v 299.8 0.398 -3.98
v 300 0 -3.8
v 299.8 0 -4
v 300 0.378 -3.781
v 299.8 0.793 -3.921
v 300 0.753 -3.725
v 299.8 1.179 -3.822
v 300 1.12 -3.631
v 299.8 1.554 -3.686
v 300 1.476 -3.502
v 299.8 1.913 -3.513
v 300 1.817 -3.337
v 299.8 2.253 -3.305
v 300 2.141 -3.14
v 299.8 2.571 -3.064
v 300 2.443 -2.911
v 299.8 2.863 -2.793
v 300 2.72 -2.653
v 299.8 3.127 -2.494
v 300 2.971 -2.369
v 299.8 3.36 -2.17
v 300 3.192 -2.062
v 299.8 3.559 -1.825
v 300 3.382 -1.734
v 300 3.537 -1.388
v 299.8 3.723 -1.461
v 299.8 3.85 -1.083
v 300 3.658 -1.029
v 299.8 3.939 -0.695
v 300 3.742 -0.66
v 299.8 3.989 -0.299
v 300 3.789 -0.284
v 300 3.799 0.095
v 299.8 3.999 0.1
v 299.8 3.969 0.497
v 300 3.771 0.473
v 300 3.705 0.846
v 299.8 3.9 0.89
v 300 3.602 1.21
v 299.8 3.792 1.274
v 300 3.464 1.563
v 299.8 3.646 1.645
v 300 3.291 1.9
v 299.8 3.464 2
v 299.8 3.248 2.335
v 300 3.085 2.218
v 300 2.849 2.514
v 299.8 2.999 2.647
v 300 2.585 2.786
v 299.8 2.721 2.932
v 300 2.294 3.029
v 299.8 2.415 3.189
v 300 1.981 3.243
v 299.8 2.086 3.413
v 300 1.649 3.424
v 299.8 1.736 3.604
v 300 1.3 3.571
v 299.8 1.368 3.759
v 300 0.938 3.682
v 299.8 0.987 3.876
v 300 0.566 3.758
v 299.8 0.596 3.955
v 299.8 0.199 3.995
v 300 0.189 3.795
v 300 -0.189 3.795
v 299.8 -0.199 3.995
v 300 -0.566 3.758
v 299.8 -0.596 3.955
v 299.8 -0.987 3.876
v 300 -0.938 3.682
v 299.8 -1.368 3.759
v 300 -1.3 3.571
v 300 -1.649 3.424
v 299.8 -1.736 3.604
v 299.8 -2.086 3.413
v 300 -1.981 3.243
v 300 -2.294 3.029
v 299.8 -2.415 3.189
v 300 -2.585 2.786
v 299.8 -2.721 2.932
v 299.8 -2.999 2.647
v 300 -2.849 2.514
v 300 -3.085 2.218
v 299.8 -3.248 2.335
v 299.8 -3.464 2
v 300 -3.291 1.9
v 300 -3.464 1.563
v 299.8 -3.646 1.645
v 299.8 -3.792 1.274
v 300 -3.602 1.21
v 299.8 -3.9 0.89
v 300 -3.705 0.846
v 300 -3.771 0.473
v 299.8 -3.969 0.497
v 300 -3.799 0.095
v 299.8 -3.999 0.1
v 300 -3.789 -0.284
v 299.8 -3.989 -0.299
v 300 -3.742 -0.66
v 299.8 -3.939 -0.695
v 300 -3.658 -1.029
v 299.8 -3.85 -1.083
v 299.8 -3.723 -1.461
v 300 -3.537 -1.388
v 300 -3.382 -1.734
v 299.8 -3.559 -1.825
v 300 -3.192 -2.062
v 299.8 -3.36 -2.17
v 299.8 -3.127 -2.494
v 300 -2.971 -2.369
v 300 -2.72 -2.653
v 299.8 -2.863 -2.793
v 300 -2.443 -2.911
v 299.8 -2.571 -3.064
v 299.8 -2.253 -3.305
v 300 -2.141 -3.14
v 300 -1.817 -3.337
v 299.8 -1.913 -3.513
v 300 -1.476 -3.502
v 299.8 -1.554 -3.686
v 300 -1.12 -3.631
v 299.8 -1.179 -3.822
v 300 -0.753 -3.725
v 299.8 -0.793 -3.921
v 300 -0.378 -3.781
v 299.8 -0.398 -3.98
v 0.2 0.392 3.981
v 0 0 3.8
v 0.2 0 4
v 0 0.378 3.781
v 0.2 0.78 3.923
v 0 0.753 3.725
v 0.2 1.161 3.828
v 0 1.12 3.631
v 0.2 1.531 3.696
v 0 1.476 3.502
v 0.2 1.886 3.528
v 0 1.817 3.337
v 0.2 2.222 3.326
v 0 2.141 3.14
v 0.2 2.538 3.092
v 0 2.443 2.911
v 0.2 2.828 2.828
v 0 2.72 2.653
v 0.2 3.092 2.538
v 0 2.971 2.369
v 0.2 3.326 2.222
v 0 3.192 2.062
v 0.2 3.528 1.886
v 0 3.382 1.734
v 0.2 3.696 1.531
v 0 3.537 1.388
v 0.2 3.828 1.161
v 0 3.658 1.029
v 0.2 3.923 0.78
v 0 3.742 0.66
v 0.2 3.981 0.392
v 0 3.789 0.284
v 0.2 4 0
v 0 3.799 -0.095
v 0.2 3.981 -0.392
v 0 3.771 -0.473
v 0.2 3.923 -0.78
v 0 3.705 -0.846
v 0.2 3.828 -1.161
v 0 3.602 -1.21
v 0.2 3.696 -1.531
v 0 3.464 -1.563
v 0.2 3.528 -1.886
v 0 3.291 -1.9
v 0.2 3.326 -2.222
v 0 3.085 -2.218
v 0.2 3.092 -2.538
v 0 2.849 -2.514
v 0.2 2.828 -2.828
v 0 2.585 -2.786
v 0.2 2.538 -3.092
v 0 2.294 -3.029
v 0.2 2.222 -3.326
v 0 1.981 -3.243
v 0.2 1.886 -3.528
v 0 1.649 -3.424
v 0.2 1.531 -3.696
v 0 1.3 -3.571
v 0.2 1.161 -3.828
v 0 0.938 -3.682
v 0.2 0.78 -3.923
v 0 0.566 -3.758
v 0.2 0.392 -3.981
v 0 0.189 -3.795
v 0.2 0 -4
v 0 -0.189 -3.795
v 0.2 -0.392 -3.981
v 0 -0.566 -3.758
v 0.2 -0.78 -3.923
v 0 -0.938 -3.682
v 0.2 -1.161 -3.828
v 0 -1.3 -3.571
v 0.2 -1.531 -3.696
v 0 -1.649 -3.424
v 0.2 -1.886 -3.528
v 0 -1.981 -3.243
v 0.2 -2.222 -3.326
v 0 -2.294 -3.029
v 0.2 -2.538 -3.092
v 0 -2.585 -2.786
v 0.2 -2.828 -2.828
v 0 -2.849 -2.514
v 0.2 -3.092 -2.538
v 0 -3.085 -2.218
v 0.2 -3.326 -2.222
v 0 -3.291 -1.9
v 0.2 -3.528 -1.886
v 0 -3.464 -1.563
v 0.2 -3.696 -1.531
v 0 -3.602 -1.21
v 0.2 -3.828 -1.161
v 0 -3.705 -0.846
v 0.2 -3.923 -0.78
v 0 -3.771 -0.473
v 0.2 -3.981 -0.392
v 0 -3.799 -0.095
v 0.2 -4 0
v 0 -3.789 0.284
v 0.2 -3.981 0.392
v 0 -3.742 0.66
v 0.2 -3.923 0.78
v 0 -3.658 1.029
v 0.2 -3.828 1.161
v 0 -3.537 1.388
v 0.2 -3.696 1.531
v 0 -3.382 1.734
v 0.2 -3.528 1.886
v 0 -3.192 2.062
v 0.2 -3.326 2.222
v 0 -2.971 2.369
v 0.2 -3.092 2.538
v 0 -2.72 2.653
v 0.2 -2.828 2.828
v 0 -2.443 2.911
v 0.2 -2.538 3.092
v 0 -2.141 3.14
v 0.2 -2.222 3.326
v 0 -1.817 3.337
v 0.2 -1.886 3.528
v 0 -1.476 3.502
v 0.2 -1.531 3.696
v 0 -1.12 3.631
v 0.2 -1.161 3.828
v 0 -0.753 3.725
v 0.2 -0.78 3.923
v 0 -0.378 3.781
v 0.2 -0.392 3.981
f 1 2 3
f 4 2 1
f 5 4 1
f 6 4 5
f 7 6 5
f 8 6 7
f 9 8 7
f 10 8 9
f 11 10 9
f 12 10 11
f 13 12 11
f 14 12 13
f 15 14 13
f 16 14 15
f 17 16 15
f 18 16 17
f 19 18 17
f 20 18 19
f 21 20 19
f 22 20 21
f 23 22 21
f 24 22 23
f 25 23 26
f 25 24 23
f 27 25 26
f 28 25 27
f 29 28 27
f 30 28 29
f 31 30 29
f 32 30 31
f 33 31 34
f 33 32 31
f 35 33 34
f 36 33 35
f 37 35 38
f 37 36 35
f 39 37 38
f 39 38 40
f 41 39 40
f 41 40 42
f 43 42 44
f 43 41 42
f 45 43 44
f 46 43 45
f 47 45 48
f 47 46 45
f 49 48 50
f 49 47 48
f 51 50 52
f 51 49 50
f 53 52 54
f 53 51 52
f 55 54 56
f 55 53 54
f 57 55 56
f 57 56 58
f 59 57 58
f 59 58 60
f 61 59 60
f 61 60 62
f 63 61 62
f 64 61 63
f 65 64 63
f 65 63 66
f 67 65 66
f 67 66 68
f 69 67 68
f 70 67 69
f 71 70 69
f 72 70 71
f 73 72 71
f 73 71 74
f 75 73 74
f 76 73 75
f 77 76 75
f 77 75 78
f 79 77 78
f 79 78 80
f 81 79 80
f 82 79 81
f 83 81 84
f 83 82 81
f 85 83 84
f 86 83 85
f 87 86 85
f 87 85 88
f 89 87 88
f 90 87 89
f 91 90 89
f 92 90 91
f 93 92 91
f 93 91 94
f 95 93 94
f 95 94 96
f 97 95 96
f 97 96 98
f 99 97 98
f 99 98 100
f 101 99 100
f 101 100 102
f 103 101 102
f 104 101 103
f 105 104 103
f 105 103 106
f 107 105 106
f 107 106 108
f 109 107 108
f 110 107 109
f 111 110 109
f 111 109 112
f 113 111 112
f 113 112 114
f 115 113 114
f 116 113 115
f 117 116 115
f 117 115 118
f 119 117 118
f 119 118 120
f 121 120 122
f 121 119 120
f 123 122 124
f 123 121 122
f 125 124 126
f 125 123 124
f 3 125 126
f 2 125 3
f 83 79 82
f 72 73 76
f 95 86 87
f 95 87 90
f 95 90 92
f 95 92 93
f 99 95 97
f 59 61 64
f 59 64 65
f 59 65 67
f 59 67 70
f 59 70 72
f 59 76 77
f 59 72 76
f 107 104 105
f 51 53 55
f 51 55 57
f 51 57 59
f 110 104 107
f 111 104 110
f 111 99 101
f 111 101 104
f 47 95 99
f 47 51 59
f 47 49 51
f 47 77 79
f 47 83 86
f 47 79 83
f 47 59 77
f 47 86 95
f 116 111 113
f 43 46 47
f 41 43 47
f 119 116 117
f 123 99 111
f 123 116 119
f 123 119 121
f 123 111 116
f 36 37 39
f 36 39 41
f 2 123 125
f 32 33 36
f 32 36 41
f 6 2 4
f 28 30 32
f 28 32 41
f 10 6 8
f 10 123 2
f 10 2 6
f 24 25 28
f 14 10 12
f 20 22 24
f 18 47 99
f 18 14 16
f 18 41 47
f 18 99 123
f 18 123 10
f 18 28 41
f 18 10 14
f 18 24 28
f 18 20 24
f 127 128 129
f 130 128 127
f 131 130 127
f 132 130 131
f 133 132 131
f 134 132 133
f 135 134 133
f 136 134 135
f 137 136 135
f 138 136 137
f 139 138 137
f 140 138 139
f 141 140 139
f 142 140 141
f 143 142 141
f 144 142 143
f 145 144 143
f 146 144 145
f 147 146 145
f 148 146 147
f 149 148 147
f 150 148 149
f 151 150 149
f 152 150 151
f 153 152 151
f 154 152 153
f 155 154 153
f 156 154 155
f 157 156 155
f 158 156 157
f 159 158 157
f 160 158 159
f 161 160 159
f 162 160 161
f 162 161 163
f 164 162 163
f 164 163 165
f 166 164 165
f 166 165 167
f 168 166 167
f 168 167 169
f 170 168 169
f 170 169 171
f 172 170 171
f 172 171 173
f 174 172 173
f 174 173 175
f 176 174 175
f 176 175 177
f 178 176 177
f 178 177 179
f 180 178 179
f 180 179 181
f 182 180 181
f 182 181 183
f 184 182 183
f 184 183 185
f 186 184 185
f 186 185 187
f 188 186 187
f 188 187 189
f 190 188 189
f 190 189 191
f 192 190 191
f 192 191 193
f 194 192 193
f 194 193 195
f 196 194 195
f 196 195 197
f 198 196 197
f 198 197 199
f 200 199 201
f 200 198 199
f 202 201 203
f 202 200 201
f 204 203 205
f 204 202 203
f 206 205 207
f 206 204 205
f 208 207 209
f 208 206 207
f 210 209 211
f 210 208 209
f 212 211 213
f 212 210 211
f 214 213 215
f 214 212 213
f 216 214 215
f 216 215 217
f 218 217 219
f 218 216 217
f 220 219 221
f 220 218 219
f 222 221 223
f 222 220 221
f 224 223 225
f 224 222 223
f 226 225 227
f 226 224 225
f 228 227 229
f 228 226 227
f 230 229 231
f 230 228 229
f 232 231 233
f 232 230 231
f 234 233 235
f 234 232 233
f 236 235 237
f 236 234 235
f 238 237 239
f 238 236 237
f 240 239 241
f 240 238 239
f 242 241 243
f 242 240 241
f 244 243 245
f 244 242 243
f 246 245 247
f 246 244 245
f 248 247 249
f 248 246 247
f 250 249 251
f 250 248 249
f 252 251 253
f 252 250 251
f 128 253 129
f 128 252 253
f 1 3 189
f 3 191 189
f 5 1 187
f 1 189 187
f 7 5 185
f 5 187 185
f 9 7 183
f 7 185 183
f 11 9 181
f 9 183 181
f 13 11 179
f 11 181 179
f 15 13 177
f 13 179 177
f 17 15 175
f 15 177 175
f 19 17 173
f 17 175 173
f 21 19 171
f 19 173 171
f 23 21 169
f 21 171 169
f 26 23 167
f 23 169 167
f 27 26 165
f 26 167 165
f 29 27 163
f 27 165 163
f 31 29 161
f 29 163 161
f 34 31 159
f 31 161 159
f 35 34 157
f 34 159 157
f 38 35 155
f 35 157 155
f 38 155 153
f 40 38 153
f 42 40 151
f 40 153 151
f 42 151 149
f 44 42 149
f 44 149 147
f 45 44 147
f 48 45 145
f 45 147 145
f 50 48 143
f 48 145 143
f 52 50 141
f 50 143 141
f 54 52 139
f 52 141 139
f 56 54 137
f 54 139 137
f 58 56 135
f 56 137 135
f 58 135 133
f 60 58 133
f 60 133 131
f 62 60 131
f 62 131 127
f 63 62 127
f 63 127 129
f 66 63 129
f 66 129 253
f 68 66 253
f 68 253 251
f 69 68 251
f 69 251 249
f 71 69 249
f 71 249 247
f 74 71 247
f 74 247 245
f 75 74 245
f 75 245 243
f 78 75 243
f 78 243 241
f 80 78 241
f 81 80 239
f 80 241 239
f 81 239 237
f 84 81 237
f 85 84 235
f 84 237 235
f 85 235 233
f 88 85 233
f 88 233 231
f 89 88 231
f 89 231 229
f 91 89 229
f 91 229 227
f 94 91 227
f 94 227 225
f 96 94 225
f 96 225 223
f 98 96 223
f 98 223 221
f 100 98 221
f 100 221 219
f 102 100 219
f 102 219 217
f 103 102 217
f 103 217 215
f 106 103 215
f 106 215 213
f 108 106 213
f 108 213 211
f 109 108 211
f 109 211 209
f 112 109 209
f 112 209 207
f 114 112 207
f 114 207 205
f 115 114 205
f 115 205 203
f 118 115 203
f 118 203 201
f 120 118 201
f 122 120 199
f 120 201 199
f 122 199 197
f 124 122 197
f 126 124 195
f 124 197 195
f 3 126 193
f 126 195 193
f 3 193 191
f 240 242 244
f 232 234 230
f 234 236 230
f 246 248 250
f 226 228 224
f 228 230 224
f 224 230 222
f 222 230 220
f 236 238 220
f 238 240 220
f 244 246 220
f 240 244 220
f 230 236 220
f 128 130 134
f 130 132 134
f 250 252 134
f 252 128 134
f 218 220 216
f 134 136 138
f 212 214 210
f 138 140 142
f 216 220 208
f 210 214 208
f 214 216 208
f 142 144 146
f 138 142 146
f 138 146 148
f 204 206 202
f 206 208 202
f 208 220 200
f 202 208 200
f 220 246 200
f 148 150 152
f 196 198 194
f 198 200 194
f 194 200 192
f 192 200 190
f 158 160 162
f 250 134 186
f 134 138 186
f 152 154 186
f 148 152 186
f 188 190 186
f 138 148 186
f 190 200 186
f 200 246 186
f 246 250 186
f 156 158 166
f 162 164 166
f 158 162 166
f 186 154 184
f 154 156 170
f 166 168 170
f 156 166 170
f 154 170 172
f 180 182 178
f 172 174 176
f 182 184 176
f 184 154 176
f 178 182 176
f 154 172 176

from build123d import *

# Parameters (mm, degrees)
SKETCH1_R           = 4
BOSS_EXTRUDE1_DEPTH = 300
SKETCH5_OUTSIDE_W   = 672.15
SKETCH5_OUTSIDE_H   = 672.15
SKETCH5_OUTSIDE_R   = 3.8
CUT_EXTRUDE2_DEPTH  = 301.053328593
CUT_EXTRUDE2_DRAFT  = -45
SKETCH6_OUTSIDE_W   = 672.15
SKETCH6_OUTSIDE_H   = 672.15
SKETCH6_OUTSIDE_R   = 3.8
CUT_EXTRUDE3_DEPTH  = 301.053328593
CUT_EXTRUDE3_DRAFT  = -45


with BuildPart() as part:
    # Sketch1 → Boss-Extrude1 (new body)
    with BuildSketch(Plane(origin=(0, 0, 0), x_dir=(0, 0, -1), z_dir=(1, 0, 0))):
        Circle(SKETCH1_R)
    extrude(amount=BOSS_EXTRUDE1_DEPTH)


with BuildPart() as cut_extrude2_tool:
    # Sketch5 outside → Cut-Extrude2 (with draft: the straight prism first)
    with BuildSketch(Plane.ZY):
        Rectangle(SKETCH5_OUTSIDE_W, SKETCH5_OUTSIDE_H)
        Circle(SKETCH5_OUTSIDE_R, mode=Mode.SUBTRACT)
    extrude(amount=-CUT_EXTRUDE2_DEPTH)
    # Cut-Extrude2: the draft: its side faces are tilted about the plane it starts from
    cut_extrude2_sides = [cut_extrude2_tool.faces().sort_by_distance(p)[0] for p in [
        (150.526664297, -336.075, 0),
        (150.526664297, 0, 336.075),
        (150.526664297, 336.075, 0),
        (150.526664297, 0, -336.075),
        (150.526664297, 0, -3.8),
    ]]
    draft(cut_extrude2_sides, Plane.ZY, CUT_EXTRUDE2_DRAFT)


with BuildPart() as part_1:
    add(part.part)

    # Cut-Extrude2: cut by cut_extrude2_tool
    add(cut_extrude2_tool.part, mode=Mode.SUBTRACT)


with BuildPart() as cut_extrude3_tool:
    # Sketch6 outside → Cut-Extrude3 (with draft: the straight prism first)
    with BuildSketch(Plane(origin=(300, 0, 0), x_dir=(0, 0, -1), z_dir=(1, 0, 0))):
        Rectangle(SKETCH6_OUTSIDE_W, SKETCH6_OUTSIDE_H)
        Circle(SKETCH6_OUTSIDE_R, mode=Mode.SUBTRACT)
    extrude(amount=-CUT_EXTRUDE3_DEPTH)
    # Cut-Extrude3: the draft: its side faces are tilted about the plane it starts from
    cut_extrude3_sides = [cut_extrude3_tool.faces().sort_by_distance(p)[0] for p in [
        (149.473335703, -336.075, 0),
        (149.473335703, 0, -336.075),
        (149.473335703, 336.075, 0),
        (149.473335703, 0, 336.075),
        (149.473335703, 0, 3.8),
    ]]
    draft(cut_extrude3_sides, Plane(origin=(300, 0, 0), x_dir=(0, 0, -1), z_dir=(1, 0, 0)), CUT_EXTRUDE3_DRAFT)


with BuildPart() as part_2:
    add(part_1.part)

    # Cut-Extrude3: cut by cut_extrude3_tool
    add(cut_extrude3_tool.part, mode=Mode.SUBTRACT)


solid = part_2.part
